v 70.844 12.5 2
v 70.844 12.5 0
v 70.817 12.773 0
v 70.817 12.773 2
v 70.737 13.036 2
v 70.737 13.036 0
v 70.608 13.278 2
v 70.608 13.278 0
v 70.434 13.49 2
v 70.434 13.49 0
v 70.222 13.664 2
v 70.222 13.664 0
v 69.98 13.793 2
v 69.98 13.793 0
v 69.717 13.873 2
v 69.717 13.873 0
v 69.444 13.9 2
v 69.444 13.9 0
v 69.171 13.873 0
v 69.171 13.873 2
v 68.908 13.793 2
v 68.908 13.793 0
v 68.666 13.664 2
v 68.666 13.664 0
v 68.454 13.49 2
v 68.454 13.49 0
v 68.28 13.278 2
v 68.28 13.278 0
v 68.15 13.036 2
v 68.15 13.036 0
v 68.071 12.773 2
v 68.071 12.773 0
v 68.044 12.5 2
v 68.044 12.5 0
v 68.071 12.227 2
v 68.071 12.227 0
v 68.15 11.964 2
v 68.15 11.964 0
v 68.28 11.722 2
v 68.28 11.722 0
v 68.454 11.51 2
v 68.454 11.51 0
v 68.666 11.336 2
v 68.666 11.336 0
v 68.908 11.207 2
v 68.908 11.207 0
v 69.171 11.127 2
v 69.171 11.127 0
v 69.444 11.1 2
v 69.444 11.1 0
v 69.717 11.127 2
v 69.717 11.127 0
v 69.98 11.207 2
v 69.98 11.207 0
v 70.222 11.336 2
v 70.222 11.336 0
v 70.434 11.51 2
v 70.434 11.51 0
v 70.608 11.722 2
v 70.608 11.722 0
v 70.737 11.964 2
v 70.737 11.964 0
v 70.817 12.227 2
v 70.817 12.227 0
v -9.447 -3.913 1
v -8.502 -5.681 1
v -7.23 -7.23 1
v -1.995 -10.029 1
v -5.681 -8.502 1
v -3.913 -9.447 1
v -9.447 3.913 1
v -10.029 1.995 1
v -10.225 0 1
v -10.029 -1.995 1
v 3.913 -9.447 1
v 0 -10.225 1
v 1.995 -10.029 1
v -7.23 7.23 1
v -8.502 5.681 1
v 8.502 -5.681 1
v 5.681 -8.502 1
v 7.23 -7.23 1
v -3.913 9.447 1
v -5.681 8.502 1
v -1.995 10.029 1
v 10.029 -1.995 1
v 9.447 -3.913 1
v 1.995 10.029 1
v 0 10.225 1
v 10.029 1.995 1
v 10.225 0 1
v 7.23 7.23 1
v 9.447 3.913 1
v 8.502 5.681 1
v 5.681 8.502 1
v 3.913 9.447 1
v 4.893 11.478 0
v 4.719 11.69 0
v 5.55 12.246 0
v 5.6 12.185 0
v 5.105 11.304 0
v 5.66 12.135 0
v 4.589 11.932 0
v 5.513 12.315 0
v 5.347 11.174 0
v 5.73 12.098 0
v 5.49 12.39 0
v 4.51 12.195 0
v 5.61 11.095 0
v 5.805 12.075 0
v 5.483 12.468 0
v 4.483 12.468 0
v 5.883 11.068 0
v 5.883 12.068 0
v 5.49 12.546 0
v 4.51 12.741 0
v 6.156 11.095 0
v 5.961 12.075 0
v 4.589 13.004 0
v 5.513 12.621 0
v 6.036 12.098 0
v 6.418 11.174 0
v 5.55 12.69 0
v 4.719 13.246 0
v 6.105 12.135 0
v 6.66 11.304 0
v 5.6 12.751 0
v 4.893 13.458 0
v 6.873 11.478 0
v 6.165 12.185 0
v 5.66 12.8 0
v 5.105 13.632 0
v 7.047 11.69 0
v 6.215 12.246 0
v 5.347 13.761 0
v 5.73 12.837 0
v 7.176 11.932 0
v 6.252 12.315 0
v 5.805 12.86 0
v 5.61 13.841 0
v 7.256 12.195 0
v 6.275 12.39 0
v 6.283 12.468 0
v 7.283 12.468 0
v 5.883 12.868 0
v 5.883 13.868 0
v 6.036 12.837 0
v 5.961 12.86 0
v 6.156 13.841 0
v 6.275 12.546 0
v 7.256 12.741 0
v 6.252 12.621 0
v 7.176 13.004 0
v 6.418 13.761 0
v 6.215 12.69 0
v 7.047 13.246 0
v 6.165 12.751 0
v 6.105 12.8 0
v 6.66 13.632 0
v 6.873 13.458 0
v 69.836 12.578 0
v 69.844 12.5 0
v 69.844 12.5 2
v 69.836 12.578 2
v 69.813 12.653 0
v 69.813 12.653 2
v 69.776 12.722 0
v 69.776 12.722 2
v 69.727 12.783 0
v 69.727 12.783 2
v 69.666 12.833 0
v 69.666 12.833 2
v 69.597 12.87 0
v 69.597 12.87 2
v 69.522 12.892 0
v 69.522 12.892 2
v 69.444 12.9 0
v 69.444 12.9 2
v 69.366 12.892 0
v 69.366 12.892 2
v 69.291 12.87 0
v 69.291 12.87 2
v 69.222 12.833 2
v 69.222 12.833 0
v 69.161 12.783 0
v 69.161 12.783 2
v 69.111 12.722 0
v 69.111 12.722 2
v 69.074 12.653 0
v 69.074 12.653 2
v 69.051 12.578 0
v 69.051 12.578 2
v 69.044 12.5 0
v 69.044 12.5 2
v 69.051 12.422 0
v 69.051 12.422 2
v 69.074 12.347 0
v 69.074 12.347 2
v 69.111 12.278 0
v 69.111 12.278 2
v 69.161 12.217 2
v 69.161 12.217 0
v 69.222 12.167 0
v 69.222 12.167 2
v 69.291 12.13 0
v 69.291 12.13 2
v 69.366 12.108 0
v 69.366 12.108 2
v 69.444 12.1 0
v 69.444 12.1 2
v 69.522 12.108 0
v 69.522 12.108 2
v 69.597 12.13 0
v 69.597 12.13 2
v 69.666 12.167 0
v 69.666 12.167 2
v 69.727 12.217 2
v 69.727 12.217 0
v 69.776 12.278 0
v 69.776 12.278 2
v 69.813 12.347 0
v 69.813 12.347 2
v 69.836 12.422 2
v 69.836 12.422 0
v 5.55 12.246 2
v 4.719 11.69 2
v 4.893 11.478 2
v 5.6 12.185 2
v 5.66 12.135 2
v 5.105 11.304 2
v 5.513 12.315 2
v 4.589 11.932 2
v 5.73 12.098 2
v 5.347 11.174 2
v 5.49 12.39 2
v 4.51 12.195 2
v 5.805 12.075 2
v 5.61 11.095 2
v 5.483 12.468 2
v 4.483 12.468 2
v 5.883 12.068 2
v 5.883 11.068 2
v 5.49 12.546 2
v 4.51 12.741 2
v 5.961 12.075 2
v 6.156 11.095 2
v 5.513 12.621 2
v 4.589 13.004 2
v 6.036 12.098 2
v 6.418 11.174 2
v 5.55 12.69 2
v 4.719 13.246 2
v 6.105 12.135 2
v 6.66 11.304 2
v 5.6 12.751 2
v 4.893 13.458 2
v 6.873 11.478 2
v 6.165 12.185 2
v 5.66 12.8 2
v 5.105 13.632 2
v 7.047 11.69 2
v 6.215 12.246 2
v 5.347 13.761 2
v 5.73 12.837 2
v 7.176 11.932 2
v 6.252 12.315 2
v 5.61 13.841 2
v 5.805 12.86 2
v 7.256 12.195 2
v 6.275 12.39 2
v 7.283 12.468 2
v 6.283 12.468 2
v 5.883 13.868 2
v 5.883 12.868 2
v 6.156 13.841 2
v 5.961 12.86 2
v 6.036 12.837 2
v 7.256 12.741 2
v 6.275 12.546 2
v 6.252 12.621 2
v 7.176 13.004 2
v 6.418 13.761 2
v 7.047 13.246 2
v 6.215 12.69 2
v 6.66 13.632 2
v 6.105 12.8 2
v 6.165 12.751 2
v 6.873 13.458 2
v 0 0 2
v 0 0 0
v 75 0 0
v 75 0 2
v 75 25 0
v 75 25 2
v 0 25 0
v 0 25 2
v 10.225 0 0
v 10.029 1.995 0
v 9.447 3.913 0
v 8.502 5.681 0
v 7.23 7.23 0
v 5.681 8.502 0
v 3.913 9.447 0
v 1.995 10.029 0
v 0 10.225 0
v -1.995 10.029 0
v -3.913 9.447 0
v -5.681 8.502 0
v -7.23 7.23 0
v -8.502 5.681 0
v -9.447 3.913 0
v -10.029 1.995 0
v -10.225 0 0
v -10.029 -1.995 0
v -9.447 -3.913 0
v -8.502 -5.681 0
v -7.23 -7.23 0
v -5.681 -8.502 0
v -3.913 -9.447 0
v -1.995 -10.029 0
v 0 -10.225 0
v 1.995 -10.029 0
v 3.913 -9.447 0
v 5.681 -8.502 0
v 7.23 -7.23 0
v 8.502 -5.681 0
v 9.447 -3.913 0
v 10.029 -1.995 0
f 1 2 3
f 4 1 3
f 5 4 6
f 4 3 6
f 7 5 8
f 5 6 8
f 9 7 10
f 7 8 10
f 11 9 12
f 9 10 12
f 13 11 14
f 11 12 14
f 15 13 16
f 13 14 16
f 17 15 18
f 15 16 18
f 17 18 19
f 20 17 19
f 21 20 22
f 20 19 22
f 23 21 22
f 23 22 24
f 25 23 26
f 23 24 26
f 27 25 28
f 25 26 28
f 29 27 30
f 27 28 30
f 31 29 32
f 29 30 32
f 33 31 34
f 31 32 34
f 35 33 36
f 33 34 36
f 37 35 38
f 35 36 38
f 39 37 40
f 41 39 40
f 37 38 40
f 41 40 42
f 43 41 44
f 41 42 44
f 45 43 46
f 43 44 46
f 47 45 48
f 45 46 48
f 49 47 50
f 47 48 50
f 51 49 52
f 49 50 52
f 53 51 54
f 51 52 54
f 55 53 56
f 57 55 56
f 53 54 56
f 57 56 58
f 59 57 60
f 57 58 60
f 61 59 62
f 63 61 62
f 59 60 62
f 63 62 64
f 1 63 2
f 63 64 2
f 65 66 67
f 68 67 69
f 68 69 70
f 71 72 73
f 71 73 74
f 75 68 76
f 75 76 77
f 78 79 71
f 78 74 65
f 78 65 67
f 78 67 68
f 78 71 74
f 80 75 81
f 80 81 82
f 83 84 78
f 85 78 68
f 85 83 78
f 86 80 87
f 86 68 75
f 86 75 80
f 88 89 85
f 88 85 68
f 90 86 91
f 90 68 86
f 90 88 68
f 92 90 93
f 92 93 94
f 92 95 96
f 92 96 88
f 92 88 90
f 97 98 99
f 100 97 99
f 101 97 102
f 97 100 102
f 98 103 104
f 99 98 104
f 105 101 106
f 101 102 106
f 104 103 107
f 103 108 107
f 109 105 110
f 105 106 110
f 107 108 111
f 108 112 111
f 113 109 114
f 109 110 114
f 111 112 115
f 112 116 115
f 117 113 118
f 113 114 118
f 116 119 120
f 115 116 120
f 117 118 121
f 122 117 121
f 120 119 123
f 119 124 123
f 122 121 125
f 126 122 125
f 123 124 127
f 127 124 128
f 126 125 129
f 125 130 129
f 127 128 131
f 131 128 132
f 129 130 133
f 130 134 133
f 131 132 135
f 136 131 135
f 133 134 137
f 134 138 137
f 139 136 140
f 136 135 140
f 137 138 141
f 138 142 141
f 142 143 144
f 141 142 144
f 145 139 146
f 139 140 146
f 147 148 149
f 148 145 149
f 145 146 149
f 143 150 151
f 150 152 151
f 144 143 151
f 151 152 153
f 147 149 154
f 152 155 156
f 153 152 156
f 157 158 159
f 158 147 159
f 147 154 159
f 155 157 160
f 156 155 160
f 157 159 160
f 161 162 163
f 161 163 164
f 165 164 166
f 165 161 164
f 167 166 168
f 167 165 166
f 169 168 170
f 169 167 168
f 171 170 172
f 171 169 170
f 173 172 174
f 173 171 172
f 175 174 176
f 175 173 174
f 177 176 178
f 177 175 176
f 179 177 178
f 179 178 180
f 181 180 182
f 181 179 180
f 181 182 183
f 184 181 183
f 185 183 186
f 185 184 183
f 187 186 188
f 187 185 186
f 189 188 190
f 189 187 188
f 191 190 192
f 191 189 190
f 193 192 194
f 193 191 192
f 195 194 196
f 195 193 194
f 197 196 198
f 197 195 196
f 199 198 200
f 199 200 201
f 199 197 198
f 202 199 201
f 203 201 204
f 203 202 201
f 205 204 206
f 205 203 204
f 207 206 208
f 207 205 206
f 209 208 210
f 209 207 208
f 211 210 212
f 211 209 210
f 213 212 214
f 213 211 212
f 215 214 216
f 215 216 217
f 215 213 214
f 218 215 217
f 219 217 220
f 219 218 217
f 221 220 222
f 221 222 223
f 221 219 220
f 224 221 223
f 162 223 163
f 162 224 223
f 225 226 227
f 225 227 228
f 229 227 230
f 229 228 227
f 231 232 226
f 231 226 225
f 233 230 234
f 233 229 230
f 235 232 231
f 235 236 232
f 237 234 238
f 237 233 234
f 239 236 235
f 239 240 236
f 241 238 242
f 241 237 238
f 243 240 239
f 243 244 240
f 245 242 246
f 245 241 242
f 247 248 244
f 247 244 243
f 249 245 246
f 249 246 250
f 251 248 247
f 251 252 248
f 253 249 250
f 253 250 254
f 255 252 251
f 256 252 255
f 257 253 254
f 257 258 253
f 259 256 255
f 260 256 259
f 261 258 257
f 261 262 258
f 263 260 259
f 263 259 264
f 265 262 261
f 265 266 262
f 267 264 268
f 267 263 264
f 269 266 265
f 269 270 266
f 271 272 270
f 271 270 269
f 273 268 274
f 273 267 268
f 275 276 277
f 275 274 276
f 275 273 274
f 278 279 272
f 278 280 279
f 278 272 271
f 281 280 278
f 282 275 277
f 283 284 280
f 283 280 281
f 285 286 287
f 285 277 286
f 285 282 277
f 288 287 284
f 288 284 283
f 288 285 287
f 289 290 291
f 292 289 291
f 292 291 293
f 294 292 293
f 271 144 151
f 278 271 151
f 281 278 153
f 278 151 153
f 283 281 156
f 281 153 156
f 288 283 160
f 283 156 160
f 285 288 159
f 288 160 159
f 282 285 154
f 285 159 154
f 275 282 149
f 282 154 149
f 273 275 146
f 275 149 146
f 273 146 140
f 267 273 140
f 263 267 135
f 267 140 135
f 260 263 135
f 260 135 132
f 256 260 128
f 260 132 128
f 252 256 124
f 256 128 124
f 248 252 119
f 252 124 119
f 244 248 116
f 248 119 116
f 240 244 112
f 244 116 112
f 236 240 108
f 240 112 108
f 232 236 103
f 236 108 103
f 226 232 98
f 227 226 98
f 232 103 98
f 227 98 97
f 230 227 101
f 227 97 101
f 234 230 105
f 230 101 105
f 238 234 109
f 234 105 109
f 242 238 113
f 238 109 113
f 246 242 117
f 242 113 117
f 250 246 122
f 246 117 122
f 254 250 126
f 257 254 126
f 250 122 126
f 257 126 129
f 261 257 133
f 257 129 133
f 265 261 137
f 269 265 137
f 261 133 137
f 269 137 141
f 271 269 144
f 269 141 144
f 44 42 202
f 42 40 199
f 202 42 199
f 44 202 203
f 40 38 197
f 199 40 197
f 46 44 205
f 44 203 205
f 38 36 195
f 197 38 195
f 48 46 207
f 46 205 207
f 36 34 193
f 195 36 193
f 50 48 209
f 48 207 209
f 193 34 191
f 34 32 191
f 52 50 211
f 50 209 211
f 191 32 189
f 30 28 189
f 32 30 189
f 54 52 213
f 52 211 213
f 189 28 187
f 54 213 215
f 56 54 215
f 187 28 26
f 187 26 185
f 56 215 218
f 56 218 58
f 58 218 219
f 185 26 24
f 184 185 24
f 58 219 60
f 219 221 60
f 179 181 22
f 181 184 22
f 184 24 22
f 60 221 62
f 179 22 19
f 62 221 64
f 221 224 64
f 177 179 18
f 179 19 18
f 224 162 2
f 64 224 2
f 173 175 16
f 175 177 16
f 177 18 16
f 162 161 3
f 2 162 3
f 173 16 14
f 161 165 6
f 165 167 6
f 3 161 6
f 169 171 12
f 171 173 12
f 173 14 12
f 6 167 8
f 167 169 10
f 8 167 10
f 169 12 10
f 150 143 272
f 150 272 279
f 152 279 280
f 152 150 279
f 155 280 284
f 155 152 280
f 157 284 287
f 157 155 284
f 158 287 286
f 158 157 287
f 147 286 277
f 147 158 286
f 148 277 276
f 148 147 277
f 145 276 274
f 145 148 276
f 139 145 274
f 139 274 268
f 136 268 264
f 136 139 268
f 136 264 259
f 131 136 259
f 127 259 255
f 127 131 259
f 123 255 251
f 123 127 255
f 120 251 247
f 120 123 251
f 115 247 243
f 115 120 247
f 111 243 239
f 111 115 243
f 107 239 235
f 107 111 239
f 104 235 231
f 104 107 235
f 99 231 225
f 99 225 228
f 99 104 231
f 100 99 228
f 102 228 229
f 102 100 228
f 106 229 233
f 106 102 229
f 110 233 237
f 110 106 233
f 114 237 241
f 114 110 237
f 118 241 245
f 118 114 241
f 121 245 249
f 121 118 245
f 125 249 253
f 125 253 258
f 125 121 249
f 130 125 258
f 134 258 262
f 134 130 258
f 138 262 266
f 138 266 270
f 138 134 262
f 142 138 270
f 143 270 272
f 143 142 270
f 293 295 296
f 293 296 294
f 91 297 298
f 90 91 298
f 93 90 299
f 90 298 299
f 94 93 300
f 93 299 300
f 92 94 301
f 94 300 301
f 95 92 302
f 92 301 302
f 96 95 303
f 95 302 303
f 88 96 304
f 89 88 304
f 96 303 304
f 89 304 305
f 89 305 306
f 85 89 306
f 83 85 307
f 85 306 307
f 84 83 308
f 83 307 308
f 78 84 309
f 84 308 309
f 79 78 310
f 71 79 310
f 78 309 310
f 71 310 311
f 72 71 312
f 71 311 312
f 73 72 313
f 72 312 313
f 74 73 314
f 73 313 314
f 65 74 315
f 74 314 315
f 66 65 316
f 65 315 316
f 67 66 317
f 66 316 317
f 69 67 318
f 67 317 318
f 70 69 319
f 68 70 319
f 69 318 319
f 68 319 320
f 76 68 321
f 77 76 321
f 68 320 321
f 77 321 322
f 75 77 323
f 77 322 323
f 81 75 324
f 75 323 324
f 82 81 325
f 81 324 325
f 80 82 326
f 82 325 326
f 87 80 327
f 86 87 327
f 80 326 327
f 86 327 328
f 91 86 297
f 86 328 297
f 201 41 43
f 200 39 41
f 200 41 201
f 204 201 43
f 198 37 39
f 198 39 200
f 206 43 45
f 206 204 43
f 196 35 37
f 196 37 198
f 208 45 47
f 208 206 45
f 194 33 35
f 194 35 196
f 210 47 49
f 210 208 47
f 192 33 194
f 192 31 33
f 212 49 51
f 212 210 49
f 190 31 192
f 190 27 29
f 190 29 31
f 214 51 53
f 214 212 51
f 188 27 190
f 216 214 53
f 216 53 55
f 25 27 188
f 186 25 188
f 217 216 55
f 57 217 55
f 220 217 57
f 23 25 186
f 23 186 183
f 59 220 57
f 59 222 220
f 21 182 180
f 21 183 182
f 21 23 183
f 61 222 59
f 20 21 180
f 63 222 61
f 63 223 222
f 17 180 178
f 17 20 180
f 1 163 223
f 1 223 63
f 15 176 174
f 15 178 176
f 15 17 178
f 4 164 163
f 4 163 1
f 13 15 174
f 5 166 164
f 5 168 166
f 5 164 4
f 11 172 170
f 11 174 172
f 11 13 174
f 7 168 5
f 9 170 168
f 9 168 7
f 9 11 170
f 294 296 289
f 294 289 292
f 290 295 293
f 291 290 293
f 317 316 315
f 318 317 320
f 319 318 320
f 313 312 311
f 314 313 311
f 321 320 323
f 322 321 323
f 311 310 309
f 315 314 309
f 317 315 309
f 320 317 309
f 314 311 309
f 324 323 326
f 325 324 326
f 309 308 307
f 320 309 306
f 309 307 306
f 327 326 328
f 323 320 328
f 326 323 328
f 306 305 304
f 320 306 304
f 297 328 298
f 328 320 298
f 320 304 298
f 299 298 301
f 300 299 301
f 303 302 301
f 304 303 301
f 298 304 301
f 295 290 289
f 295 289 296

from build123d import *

# Parameters (mm, degrees)
F0_W     = 75
F0_H     = 25
F4_DEPTH = 0.4
F3_W     = 75
F3_H     = 25
F3_R     = 10.25
F5_DEPTH = 1.6
F2_W     = 75
F2_H     = 25
F6_DEPTH = 2
F1_R     = 1.4
F1_R_2   = 0.4
F7_DEPTH = 2
F8_R     = 10.225
F9_DEPTH = 1


with BuildPart() as f4:
    # F0 (on Top) → F4 (new body)
    with BuildSketch(Plane.XY):
        with Locations((37.5, 12.5)):
            Rectangle(F0_W, F0_H)
    extrude(amount=F4_DEPTH)

    # F3 (on Top) → F5 (join)
    with BuildSketch(Plane.XY):
        with Locations((37.5, 12.5)):
            Rectangle(F3_W, F3_H)
        with Locations((41.7743064463, 12.5000113621)):
            Circle(F3_R, mode=Mode.SUBTRACT)
    extrude(amount=F5_DEPTH)

    # F2 (on Top) → F6 (join)
    with BuildSketch(Plane.XY):
        with Locations((37.5, 12.5)):
            Rectangle(F2_W, F2_H)
        with BuildLine():
            Line((20.9633884676, 8.163), (20.9633884676, 9.0255))
            ThreePointArc((20.9633884676, 9.0255), (21.0805457551, 9.3083427125), (21.3633884676, 9.4255))
            Line((21.3633884676, 9.4255), (24.7770920396, 9.4255))
            Line((24.7770920396, 9.4255), (32.905688939, 7.3625277004))
            Line((32.905688939, 7.3625277004), (24.7770920396, 5.3))
            Line((24.7770920396, 5.3), (21.3633884676, 5.3))
            ThreePointArc((21.3633884676, 5.3), (21.0805457551, 5.4171572875), (20.9633884676, 5.7))
            Line((20.9633884676, 5.7), (20.9633884676, 6.563))
            ThreePointArc((20.9633884676, 6.563), (20.6146360295, 7.0607260803), (20.0873884676, 7.363))
            ThreePointArc((20.0873884676, 7.363), (20.6146360295, 7.6652739197), (20.9633884676, 8.163))
        make_face(mode=Mode.SUBTRACT)
        with BuildLine():
            ThreePointArc((17.3638739623, 7.863), (17.0810312498, 7.9801572875), (16.9638739623, 8.263))
            Line((16.9638739623, 8.263), (16.9638739623, 11.5626839529))
            ThreePointArc((16.9638739623, 11.5626839529), (16.5400607006, 12.1874218401), (15.8528853208, 12.5))
            ThreePointArc((15.8528853208, 12.5), (16.6743001007, 13.0131119919), (16.9638739623, 13.9373160471))
            Line((16.9638739623, 13.9373160471), (16.9638739623, 16.7375))
            ThreePointArc((16.9638739623, 16.7375), (17.0810312498, 17.0203427125), (17.3638739623, 17.1375))
            Line((17.3638739623, 17.1375), (19.5638739623, 17.1375))
            ThreePointArc((19.5638739623, 17.1375), (19.8467166748, 17.0203427125), (19.9638739623, 16.7375))
            Line((19.9638739623, 16.7375), (19.9638739623, 15.5745))
            Line((19.9638739623, 15.5745), (19.9638739623, 15.0745))
            Line((19.9638739623, 15.0745), (19.9638739623, 14.9745))
            ThreePointArc((19.9638739623, 14.9745), (20.0810312498, 14.6916572875), (20.3638739623, 14.5745))
            Line((20.3638739623, 14.5745), (24.7770920396, 14.5745))
            Line((24.7770920396, 14.5745), (31.5258568066, 12.49955))
            Line((31.5258568066, 12.49955), (24.7770920396, 10.4255))
            Line((24.7770920396, 10.4255), (20.3633884676, 10.4255))
            ThreePointArc((20.3633884676, 10.4255), (20.0805457551, 10.3083427125), (19.9633884676, 10.0255))
            Line((19.9633884676, 10.0255), (19.9633884676, 9.9255))
            Line((19.9633884676, 9.9255), (19.9633884676, 9.4255))
            Line((19.9633884676, 9.4255), (19.9633884676, 8.263))
            ThreePointArc((19.9633884676, 8.263), (19.8462311801, 7.9801572875), (19.5633884676, 7.863))
            Line((19.5633884676, 7.863), (17.3638739623, 7.863))
        make_face(mode=Mode.SUBTRACT)
        with BuildLine():
            ThreePointArc((21.3638739623, 15.5745), (21.0810312498, 15.6916572875), (20.9638739623, 15.9745))
            Line((20.9638739623, 15.9745), (20.9638739623, 16.8364493074))
            ThreePointArc((20.9638739623, 16.8364493074), (20.61521579, 17.3303099873), (20.0904036045, 17.6303650859))
            ThreePointArc((20.0904036045, 17.6303650859), (20.61521579, 17.9304201845), (20.9638739623, 18.4242808644))
            Line((20.9638739623, 18.4242808644), (20.9638739623, 19.3))
            ThreePointArc((20.9638739623, 19.3), (21.0810312498, 19.5828427125), (21.3638739623, 19.7))
            Line((21.3638739623, 19.7), (24.7770920396, 19.7))
            Line((24.7770920396, 19.7), (32.9031571746, 17.6303650859))
            Line((32.9031571746, 17.6303650859), (24.7770920396, 15.5745))
            Line((24.7770920396, 15.5745), (21.3638739623, 15.5745))
        make_face(mode=Mode.SUBTRACT)
        with BuildLine():
            ThreePointArc((21.3633884676, 9.4255), (21.0805457551, 9.3083427125), (20.9633884676, 9.0255))
            Line((20.9633884676, 9.0255), (20.9633884676, 8.163))
            ThreePointArc((20.9633884676, 8.163), (20.6146360295, 7.6652739197), (20.0873884676, 7.363))
            ThreePointArc((20.0873884676, 7.363), (20.6146360295, 7.0607260803), (20.9633884676, 6.563))
            Line((20.9633884676, 6.563), (20.9633884676, 5.7))
            ThreePointArc((20.9633884676, 5.7), (21.0805457551, 5.4171572875), (21.3633884676, 5.3))
            Line((21.3633884676, 5.3), (24.7770920396, 5.3))
            Line((24.7770920396, 5.3), (32.905688939, 7.3625277004))
            Line((32.905688939, 7.3625277004), (24.7770920396, 9.4255))
            Line((24.7770920396, 9.4255), (21.3633884676, 9.4255))
        make_face()
        with BuildLine():
            Line((16.9638739623, 11.5626839529), (16.9638739623, 8.263))
            ThreePointArc((16.9638739623, 8.263), (17.0810312498, 7.9801572875), (17.3638739623, 7.863))
            Line((17.3638739623, 7.863), (19.5633884676, 7.863))
            ThreePointArc((19.5633884676, 7.863), (19.8462311801, 7.9801572875), (19.9633884676, 8.263))
            Line((19.9633884676, 8.263), (19.9633884676, 9.4255))
            Line((19.9633884676, 9.4255), (19.9633884676, 9.9255))
            Line((19.9633884676, 9.9255), (19.9633884676, 10.0255))
            ThreePointArc((19.9633884676, 10.0255), (20.0805457551, 10.3083427125), (20.3633884676, 10.4255))
            Line((20.3633884676, 10.4255), (24.7770920396, 10.4255))
            Line((24.7770920396, 10.4255), (31.5258568066, 12.49955))
            Line((31.5258568066, 12.49955), (24.7770920396, 14.5745))
            Line((24.7770920396, 14.5745), (20.3638739623, 14.5745))
            ThreePointArc((20.3638739623, 14.5745), (20.0810312498, 14.6916572875), (19.9638739623, 14.9745))
            Line((19.9638739623, 14.9745), (19.9638739623, 15.0745))
            Line((19.9638739623, 15.0745), (19.9638739623, 15.5745))
            Line((19.9638739623, 15.5745), (19.9638739623, 16.7375))
            ThreePointArc((19.9638739623, 16.7375), (19.8467166748, 17.0203427125), (19.5638739623, 17.1375))
            Line((19.5638739623, 17.1375), (17.3638739623, 17.1375))
            ThreePointArc((17.3638739623, 17.1375), (17.0810312498, 17.0203427125), (16.9638739623, 16.7375))
            Line((16.9638739623, 16.7375), (16.9638739623, 13.9373160471))
            ThreePointArc((16.9638739623, 13.9373160471), (16.6743001007, 13.0131119919), (15.8528853208, 12.5))
            ThreePointArc((15.8528853208, 12.5), (16.5400607006, 12.1874218401), (16.9638739623, 11.5626839529))
        make_face()
        with BuildLine():
            Line((20.9638739623, 16.8364493074), (20.9638739623, 15.9745))
            ThreePointArc((20.9638739623, 15.9745), (21.0810312498, 15.6916572875), (21.3638739623, 15.5745))
            Line((21.3638739623, 15.5745), (24.7770920396, 15.5745))
            Line((24.7770920396, 15.5745), (32.9031571746, 17.6303650859))
            Line((32.9031571746, 17.6303650859), (24.7770920396, 19.7))
            Line((24.7770920396, 19.7), (21.3638739623, 19.7))
            ThreePointArc((21.3638739623, 19.7), (21.0810312498, 19.5828427125), (20.9638739623, 19.3))
            Line((20.9638739623, 19.3), (20.9638739623, 18.4242808644))
            ThreePointArc((20.9638739623, 18.4242808644), (20.61521579, 17.9304201845), (20.0904036045, 17.6303650859))
            ThreePointArc((20.0904036045, 17.6303650859), (20.61521579, 17.3303099873), (20.9638739623, 16.8364493074))
        make_face()
    extrude(amount=F6_DEPTH)


with BuildPart() as f7:
    # F1 (on Top) → F7 (new body)
    with BuildSketch(Plane.XY):
        with Locations((5.882635247, 12.4678043649)):
            Circle(F1_R)
        with Locations((5.882635247, 12.4678043649)):
            Circle(F1_R_2, mode=Mode.SUBTRACT)
    extrude(amount=F7_DEPTH)


with BuildPart() as f7b:
    # F1 (on Top) → F7, piece 2 (new body)
    with BuildSketch(Plane.XY):
        with Locations((69.4437474012, 12.5000113621)):
            Circle(F1_R)
        with Locations((69.4437474012, 12.5000113621)):
            Circle(F1_R_2, mode=Mode.SUBTRACT)
    extrude(amount=F7_DEPTH)


with BuildPart() as f9:
    # F8 (on Top) → F9 (new body)
    with BuildSketch(Plane.XY):
        Circle(F8_R)
    extrude(amount=F9_DEPTH)


solid = Compound([f4.part, f7.part, f7b.part, f9.part])
